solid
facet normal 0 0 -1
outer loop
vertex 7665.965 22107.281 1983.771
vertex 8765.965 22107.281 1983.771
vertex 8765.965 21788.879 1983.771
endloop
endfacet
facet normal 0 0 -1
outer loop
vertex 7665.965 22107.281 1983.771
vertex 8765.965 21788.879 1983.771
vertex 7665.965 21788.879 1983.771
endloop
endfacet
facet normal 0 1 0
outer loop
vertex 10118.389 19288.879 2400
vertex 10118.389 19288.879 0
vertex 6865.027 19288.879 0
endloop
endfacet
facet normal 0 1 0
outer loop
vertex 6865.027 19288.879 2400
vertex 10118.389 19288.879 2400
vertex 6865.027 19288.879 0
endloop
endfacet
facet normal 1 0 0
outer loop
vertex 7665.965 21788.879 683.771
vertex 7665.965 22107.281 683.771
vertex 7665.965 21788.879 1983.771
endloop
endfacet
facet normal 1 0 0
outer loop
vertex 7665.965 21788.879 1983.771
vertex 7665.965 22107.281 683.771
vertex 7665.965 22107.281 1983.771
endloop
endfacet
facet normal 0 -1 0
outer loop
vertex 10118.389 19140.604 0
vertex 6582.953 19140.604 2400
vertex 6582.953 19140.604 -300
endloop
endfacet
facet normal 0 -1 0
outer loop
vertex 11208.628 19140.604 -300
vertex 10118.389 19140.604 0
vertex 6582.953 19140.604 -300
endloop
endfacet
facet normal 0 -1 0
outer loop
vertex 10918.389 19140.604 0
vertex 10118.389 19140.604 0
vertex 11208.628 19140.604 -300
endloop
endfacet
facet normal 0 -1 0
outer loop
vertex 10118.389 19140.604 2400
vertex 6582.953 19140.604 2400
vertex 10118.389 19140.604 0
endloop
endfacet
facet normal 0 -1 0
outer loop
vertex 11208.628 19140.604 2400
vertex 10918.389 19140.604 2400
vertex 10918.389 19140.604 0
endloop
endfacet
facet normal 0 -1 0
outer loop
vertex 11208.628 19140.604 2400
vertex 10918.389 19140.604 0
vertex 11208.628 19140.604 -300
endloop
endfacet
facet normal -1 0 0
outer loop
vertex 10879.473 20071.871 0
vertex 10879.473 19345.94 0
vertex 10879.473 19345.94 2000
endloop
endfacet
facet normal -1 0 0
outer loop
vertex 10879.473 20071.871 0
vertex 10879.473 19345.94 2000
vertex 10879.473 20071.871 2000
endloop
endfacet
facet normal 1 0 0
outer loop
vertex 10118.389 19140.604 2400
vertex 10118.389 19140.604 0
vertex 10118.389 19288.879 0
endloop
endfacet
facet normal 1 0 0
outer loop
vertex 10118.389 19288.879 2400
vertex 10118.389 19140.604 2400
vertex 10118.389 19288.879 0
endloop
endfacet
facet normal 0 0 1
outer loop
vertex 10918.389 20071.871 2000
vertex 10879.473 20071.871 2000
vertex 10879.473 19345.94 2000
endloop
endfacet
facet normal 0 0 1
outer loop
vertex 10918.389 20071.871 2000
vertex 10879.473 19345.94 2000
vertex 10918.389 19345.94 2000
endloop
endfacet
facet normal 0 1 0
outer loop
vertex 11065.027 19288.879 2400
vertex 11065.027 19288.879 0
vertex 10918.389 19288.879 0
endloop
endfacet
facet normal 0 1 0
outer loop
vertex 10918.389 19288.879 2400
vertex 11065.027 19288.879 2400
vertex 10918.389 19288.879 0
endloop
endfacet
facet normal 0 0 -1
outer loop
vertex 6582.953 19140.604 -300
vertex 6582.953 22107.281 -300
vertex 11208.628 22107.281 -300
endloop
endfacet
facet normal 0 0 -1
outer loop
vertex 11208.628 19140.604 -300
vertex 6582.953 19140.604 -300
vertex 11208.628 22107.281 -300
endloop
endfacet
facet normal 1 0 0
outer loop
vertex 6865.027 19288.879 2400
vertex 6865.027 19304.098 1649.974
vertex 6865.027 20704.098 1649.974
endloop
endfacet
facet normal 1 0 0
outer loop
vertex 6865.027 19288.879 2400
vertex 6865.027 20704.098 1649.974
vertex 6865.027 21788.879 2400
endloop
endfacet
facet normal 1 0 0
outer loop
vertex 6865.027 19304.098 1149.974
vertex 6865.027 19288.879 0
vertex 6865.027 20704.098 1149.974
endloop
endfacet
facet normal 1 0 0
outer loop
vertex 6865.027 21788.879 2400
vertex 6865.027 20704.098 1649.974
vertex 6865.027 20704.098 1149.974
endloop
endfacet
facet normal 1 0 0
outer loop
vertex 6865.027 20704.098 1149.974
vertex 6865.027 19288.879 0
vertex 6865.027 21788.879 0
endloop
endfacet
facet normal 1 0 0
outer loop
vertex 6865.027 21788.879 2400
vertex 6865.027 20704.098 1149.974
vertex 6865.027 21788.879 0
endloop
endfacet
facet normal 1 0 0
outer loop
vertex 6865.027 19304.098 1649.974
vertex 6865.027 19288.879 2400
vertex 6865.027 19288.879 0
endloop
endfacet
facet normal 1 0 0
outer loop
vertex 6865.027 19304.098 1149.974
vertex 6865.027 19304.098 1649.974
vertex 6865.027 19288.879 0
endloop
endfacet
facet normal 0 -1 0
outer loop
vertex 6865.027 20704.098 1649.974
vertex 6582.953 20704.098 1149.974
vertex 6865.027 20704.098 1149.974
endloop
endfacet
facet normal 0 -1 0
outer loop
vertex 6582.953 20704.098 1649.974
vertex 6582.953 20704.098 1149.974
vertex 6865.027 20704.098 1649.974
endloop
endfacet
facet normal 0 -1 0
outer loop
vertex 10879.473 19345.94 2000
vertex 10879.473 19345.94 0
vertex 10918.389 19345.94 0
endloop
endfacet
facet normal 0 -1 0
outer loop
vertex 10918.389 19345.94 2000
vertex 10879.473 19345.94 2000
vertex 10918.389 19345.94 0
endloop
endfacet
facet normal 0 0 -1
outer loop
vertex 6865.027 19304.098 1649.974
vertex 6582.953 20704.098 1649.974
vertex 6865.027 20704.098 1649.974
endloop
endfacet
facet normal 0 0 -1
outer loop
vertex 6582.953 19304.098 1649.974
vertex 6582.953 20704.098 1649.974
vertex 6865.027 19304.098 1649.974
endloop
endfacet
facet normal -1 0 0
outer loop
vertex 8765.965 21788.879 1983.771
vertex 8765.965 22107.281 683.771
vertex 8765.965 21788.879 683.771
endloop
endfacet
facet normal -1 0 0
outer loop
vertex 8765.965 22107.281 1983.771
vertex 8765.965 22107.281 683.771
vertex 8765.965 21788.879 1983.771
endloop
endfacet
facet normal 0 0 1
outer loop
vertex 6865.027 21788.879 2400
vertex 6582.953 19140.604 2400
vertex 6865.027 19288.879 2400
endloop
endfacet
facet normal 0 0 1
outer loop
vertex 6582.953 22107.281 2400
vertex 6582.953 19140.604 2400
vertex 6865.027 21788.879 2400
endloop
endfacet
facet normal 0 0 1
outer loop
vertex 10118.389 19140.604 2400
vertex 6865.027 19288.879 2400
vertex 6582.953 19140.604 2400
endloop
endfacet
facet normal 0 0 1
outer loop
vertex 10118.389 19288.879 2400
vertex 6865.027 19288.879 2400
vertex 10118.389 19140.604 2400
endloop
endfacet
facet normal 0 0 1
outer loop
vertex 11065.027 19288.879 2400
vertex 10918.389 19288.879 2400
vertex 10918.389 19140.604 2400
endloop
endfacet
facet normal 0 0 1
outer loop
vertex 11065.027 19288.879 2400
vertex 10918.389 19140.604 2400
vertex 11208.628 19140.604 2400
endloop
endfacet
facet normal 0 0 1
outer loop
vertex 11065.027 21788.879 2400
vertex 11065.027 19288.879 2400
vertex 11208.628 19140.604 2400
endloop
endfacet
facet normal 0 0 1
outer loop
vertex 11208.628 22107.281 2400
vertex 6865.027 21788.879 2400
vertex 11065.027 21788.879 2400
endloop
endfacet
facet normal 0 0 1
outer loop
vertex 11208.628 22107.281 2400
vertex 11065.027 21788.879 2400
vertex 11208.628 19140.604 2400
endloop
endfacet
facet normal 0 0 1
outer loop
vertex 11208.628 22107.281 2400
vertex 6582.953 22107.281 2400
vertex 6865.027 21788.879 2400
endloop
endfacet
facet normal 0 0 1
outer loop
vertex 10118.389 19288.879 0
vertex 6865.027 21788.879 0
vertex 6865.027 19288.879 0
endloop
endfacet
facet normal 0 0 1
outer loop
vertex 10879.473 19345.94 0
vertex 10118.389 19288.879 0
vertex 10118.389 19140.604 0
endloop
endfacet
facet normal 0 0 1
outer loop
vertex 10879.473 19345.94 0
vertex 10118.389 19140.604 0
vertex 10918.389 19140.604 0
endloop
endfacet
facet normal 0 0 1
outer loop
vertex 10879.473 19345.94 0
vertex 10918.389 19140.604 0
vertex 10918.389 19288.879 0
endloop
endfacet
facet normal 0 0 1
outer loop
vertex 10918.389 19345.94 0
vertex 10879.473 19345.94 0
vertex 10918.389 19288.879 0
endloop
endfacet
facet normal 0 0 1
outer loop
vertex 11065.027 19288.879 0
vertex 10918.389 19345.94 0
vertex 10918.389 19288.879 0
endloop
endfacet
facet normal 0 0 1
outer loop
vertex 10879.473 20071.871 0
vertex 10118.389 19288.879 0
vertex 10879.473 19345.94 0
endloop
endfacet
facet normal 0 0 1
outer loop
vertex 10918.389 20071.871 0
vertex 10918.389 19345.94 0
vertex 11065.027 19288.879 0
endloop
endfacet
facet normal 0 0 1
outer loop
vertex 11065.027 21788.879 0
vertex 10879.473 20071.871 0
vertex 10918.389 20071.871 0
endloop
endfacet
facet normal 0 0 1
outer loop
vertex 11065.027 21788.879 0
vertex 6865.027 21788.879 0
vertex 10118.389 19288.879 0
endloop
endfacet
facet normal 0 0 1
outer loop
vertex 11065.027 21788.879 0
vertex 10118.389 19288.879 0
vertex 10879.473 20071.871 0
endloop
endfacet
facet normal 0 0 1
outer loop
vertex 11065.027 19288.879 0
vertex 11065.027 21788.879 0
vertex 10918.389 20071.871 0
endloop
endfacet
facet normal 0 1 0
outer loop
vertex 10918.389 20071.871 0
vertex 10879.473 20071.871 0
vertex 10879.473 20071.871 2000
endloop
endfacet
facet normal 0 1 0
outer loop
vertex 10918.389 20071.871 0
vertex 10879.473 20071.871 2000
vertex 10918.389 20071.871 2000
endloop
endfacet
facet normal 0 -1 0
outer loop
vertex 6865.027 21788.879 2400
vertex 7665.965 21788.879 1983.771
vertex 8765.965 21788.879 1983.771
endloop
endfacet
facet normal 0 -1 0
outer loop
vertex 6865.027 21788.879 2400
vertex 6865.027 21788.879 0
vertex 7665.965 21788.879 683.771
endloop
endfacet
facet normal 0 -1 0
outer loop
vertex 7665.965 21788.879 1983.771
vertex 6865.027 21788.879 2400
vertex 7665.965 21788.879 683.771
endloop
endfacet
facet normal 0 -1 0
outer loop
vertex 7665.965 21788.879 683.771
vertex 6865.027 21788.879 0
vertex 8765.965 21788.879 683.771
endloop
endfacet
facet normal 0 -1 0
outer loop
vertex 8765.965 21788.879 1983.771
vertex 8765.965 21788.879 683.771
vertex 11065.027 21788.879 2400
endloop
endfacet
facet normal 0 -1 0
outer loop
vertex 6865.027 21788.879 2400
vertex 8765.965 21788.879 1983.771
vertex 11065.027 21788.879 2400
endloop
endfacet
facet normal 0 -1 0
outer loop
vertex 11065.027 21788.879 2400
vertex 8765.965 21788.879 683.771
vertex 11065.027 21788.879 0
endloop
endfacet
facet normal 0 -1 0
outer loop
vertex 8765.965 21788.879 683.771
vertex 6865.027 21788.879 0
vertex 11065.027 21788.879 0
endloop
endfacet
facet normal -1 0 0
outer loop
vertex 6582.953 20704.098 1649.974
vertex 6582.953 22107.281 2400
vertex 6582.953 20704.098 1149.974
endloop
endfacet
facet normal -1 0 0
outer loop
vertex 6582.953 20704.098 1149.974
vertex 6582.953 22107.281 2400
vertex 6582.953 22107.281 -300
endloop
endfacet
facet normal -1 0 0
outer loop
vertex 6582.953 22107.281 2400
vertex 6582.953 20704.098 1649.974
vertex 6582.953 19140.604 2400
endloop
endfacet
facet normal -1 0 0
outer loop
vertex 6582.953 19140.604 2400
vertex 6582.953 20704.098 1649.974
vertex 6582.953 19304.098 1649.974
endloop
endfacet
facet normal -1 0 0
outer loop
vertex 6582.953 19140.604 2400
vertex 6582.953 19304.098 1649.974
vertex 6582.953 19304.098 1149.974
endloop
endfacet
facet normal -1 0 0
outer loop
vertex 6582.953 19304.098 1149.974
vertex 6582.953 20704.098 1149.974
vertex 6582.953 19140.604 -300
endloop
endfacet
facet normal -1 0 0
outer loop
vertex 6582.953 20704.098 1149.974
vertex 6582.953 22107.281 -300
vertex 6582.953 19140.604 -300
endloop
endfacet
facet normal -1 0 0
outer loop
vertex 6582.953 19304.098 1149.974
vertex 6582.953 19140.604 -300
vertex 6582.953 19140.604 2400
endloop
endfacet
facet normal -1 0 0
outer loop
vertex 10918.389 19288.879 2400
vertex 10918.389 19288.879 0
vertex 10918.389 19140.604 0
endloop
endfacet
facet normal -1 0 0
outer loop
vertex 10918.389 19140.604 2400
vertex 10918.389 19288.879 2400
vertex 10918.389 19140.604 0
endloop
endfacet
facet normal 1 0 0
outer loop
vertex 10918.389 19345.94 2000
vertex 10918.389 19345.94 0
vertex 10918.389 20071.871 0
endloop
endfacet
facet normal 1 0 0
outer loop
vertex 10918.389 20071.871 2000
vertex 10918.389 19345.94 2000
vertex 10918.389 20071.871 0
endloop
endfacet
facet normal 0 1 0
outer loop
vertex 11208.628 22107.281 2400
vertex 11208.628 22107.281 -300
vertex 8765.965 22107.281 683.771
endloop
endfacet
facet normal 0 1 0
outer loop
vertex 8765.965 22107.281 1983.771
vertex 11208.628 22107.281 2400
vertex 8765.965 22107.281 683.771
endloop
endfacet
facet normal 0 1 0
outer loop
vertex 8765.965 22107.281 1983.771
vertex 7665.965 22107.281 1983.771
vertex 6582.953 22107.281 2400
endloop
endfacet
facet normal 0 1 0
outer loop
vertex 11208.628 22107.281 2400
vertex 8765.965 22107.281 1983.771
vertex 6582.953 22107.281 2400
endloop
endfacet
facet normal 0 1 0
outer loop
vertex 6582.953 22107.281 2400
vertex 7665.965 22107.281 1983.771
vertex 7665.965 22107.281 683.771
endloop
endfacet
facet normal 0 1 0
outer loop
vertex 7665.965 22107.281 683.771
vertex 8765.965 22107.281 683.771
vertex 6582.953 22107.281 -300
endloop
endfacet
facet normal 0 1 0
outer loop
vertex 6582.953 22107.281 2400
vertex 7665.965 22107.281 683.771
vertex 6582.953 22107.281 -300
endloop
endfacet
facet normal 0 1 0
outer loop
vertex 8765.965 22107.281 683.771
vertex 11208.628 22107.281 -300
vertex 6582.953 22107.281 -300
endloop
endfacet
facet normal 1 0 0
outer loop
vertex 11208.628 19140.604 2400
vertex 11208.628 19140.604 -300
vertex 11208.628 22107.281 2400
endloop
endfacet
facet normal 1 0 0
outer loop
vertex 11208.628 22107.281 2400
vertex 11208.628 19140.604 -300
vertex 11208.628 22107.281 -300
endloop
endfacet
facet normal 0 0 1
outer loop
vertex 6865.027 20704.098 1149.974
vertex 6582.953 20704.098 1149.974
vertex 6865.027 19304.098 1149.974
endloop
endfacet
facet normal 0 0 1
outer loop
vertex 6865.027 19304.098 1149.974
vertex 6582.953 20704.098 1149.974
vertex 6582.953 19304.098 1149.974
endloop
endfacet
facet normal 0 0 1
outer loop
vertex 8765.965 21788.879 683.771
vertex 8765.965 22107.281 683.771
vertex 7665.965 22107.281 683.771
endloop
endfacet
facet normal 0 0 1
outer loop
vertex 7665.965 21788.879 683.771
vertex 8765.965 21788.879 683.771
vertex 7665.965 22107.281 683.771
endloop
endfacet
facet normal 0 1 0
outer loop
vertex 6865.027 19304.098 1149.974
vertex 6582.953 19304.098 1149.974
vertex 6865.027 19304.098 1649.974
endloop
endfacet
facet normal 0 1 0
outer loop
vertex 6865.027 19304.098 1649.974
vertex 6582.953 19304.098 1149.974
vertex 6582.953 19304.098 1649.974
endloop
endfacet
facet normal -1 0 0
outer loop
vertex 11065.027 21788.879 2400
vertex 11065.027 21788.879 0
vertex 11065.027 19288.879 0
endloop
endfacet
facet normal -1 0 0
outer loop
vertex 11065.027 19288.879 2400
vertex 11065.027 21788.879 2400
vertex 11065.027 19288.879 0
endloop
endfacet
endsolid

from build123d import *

# Parameters (mm, degrees)
F0_W     = 4625.674248
F0_H     = 2966.676712
F1_DEPTH = 300
F3_DEPTH = 2400
F4_W     = 1100
F4_H     = 1300
F5_DEPTH = 318.401337
F6_W     = 1400
F6_H     = 500
F7_DEPTH = 282.073784
F8_W     = 38.916
F8_H     = 725.931168
F9_DEPTH = 2000


with BuildPart() as f1:
    # F0 (on Top) → F1 (new body)
    with BuildSketch(Plane.XY):
        with Locations((8895.790577, 20623.942375)):
            Rectangle(F0_W, F0_H)
    extrude(amount=-F1_DEPTH)

    # F2 (on face) → F3 (join)
    with BuildSketch(Plane.XY):
        Polygon((6865.027237, 19288.879395), (6865.027237, 21788.879395), (11065.027237, 21788.879395), (11065.027237, 19288.879395), (10918.38913, 19288.879395), (10918.38913, 19140.604019), (11208.627701, 19140.604019), (11208.627701, 22107.280731), (6582.953453, 22107.280731), (6582.953453, 19140.604019), (10118.38913, 19140.604019), (10118.38913, 19288.879395), align=None)
    extrude(amount=F3_DEPTH)

    # F4 (on face) → F5 (cut, through all)
    with BuildSketch(Plane(origin=(0, 22107.280731, 0), x_dir=(-1, 0, 0), z_dir=(0, 1, 0))):
        with Locations((-8215.964586, 1333.770603)):
            Rectangle(F4_W, F4_H)
    extrude(amount=-F5_DEPTH, mode=Mode.SUBTRACT)

    # F6 (on face) → F7 (cut, through all)
    with BuildSketch(Plane(origin=(6582.953453, 0, 0), x_dir=(0, -1, 0), z_dir=(-1, 0, 0))):
        with Locations((-20004.098129, 1399.97381)):
            Rectangle(F6_W, F6_H)
    extrude(amount=-F7_DEPTH, mode=Mode.SUBTRACT)

    # F8 (on face) → F9 (join)
    with BuildSketch(Plane.XY):
        with Locations((10898.93113, 19708.90522)):
            Rectangle(F8_W, F8_H)
    extrude(amount=F9_DEPTH)


solid = f1.part
